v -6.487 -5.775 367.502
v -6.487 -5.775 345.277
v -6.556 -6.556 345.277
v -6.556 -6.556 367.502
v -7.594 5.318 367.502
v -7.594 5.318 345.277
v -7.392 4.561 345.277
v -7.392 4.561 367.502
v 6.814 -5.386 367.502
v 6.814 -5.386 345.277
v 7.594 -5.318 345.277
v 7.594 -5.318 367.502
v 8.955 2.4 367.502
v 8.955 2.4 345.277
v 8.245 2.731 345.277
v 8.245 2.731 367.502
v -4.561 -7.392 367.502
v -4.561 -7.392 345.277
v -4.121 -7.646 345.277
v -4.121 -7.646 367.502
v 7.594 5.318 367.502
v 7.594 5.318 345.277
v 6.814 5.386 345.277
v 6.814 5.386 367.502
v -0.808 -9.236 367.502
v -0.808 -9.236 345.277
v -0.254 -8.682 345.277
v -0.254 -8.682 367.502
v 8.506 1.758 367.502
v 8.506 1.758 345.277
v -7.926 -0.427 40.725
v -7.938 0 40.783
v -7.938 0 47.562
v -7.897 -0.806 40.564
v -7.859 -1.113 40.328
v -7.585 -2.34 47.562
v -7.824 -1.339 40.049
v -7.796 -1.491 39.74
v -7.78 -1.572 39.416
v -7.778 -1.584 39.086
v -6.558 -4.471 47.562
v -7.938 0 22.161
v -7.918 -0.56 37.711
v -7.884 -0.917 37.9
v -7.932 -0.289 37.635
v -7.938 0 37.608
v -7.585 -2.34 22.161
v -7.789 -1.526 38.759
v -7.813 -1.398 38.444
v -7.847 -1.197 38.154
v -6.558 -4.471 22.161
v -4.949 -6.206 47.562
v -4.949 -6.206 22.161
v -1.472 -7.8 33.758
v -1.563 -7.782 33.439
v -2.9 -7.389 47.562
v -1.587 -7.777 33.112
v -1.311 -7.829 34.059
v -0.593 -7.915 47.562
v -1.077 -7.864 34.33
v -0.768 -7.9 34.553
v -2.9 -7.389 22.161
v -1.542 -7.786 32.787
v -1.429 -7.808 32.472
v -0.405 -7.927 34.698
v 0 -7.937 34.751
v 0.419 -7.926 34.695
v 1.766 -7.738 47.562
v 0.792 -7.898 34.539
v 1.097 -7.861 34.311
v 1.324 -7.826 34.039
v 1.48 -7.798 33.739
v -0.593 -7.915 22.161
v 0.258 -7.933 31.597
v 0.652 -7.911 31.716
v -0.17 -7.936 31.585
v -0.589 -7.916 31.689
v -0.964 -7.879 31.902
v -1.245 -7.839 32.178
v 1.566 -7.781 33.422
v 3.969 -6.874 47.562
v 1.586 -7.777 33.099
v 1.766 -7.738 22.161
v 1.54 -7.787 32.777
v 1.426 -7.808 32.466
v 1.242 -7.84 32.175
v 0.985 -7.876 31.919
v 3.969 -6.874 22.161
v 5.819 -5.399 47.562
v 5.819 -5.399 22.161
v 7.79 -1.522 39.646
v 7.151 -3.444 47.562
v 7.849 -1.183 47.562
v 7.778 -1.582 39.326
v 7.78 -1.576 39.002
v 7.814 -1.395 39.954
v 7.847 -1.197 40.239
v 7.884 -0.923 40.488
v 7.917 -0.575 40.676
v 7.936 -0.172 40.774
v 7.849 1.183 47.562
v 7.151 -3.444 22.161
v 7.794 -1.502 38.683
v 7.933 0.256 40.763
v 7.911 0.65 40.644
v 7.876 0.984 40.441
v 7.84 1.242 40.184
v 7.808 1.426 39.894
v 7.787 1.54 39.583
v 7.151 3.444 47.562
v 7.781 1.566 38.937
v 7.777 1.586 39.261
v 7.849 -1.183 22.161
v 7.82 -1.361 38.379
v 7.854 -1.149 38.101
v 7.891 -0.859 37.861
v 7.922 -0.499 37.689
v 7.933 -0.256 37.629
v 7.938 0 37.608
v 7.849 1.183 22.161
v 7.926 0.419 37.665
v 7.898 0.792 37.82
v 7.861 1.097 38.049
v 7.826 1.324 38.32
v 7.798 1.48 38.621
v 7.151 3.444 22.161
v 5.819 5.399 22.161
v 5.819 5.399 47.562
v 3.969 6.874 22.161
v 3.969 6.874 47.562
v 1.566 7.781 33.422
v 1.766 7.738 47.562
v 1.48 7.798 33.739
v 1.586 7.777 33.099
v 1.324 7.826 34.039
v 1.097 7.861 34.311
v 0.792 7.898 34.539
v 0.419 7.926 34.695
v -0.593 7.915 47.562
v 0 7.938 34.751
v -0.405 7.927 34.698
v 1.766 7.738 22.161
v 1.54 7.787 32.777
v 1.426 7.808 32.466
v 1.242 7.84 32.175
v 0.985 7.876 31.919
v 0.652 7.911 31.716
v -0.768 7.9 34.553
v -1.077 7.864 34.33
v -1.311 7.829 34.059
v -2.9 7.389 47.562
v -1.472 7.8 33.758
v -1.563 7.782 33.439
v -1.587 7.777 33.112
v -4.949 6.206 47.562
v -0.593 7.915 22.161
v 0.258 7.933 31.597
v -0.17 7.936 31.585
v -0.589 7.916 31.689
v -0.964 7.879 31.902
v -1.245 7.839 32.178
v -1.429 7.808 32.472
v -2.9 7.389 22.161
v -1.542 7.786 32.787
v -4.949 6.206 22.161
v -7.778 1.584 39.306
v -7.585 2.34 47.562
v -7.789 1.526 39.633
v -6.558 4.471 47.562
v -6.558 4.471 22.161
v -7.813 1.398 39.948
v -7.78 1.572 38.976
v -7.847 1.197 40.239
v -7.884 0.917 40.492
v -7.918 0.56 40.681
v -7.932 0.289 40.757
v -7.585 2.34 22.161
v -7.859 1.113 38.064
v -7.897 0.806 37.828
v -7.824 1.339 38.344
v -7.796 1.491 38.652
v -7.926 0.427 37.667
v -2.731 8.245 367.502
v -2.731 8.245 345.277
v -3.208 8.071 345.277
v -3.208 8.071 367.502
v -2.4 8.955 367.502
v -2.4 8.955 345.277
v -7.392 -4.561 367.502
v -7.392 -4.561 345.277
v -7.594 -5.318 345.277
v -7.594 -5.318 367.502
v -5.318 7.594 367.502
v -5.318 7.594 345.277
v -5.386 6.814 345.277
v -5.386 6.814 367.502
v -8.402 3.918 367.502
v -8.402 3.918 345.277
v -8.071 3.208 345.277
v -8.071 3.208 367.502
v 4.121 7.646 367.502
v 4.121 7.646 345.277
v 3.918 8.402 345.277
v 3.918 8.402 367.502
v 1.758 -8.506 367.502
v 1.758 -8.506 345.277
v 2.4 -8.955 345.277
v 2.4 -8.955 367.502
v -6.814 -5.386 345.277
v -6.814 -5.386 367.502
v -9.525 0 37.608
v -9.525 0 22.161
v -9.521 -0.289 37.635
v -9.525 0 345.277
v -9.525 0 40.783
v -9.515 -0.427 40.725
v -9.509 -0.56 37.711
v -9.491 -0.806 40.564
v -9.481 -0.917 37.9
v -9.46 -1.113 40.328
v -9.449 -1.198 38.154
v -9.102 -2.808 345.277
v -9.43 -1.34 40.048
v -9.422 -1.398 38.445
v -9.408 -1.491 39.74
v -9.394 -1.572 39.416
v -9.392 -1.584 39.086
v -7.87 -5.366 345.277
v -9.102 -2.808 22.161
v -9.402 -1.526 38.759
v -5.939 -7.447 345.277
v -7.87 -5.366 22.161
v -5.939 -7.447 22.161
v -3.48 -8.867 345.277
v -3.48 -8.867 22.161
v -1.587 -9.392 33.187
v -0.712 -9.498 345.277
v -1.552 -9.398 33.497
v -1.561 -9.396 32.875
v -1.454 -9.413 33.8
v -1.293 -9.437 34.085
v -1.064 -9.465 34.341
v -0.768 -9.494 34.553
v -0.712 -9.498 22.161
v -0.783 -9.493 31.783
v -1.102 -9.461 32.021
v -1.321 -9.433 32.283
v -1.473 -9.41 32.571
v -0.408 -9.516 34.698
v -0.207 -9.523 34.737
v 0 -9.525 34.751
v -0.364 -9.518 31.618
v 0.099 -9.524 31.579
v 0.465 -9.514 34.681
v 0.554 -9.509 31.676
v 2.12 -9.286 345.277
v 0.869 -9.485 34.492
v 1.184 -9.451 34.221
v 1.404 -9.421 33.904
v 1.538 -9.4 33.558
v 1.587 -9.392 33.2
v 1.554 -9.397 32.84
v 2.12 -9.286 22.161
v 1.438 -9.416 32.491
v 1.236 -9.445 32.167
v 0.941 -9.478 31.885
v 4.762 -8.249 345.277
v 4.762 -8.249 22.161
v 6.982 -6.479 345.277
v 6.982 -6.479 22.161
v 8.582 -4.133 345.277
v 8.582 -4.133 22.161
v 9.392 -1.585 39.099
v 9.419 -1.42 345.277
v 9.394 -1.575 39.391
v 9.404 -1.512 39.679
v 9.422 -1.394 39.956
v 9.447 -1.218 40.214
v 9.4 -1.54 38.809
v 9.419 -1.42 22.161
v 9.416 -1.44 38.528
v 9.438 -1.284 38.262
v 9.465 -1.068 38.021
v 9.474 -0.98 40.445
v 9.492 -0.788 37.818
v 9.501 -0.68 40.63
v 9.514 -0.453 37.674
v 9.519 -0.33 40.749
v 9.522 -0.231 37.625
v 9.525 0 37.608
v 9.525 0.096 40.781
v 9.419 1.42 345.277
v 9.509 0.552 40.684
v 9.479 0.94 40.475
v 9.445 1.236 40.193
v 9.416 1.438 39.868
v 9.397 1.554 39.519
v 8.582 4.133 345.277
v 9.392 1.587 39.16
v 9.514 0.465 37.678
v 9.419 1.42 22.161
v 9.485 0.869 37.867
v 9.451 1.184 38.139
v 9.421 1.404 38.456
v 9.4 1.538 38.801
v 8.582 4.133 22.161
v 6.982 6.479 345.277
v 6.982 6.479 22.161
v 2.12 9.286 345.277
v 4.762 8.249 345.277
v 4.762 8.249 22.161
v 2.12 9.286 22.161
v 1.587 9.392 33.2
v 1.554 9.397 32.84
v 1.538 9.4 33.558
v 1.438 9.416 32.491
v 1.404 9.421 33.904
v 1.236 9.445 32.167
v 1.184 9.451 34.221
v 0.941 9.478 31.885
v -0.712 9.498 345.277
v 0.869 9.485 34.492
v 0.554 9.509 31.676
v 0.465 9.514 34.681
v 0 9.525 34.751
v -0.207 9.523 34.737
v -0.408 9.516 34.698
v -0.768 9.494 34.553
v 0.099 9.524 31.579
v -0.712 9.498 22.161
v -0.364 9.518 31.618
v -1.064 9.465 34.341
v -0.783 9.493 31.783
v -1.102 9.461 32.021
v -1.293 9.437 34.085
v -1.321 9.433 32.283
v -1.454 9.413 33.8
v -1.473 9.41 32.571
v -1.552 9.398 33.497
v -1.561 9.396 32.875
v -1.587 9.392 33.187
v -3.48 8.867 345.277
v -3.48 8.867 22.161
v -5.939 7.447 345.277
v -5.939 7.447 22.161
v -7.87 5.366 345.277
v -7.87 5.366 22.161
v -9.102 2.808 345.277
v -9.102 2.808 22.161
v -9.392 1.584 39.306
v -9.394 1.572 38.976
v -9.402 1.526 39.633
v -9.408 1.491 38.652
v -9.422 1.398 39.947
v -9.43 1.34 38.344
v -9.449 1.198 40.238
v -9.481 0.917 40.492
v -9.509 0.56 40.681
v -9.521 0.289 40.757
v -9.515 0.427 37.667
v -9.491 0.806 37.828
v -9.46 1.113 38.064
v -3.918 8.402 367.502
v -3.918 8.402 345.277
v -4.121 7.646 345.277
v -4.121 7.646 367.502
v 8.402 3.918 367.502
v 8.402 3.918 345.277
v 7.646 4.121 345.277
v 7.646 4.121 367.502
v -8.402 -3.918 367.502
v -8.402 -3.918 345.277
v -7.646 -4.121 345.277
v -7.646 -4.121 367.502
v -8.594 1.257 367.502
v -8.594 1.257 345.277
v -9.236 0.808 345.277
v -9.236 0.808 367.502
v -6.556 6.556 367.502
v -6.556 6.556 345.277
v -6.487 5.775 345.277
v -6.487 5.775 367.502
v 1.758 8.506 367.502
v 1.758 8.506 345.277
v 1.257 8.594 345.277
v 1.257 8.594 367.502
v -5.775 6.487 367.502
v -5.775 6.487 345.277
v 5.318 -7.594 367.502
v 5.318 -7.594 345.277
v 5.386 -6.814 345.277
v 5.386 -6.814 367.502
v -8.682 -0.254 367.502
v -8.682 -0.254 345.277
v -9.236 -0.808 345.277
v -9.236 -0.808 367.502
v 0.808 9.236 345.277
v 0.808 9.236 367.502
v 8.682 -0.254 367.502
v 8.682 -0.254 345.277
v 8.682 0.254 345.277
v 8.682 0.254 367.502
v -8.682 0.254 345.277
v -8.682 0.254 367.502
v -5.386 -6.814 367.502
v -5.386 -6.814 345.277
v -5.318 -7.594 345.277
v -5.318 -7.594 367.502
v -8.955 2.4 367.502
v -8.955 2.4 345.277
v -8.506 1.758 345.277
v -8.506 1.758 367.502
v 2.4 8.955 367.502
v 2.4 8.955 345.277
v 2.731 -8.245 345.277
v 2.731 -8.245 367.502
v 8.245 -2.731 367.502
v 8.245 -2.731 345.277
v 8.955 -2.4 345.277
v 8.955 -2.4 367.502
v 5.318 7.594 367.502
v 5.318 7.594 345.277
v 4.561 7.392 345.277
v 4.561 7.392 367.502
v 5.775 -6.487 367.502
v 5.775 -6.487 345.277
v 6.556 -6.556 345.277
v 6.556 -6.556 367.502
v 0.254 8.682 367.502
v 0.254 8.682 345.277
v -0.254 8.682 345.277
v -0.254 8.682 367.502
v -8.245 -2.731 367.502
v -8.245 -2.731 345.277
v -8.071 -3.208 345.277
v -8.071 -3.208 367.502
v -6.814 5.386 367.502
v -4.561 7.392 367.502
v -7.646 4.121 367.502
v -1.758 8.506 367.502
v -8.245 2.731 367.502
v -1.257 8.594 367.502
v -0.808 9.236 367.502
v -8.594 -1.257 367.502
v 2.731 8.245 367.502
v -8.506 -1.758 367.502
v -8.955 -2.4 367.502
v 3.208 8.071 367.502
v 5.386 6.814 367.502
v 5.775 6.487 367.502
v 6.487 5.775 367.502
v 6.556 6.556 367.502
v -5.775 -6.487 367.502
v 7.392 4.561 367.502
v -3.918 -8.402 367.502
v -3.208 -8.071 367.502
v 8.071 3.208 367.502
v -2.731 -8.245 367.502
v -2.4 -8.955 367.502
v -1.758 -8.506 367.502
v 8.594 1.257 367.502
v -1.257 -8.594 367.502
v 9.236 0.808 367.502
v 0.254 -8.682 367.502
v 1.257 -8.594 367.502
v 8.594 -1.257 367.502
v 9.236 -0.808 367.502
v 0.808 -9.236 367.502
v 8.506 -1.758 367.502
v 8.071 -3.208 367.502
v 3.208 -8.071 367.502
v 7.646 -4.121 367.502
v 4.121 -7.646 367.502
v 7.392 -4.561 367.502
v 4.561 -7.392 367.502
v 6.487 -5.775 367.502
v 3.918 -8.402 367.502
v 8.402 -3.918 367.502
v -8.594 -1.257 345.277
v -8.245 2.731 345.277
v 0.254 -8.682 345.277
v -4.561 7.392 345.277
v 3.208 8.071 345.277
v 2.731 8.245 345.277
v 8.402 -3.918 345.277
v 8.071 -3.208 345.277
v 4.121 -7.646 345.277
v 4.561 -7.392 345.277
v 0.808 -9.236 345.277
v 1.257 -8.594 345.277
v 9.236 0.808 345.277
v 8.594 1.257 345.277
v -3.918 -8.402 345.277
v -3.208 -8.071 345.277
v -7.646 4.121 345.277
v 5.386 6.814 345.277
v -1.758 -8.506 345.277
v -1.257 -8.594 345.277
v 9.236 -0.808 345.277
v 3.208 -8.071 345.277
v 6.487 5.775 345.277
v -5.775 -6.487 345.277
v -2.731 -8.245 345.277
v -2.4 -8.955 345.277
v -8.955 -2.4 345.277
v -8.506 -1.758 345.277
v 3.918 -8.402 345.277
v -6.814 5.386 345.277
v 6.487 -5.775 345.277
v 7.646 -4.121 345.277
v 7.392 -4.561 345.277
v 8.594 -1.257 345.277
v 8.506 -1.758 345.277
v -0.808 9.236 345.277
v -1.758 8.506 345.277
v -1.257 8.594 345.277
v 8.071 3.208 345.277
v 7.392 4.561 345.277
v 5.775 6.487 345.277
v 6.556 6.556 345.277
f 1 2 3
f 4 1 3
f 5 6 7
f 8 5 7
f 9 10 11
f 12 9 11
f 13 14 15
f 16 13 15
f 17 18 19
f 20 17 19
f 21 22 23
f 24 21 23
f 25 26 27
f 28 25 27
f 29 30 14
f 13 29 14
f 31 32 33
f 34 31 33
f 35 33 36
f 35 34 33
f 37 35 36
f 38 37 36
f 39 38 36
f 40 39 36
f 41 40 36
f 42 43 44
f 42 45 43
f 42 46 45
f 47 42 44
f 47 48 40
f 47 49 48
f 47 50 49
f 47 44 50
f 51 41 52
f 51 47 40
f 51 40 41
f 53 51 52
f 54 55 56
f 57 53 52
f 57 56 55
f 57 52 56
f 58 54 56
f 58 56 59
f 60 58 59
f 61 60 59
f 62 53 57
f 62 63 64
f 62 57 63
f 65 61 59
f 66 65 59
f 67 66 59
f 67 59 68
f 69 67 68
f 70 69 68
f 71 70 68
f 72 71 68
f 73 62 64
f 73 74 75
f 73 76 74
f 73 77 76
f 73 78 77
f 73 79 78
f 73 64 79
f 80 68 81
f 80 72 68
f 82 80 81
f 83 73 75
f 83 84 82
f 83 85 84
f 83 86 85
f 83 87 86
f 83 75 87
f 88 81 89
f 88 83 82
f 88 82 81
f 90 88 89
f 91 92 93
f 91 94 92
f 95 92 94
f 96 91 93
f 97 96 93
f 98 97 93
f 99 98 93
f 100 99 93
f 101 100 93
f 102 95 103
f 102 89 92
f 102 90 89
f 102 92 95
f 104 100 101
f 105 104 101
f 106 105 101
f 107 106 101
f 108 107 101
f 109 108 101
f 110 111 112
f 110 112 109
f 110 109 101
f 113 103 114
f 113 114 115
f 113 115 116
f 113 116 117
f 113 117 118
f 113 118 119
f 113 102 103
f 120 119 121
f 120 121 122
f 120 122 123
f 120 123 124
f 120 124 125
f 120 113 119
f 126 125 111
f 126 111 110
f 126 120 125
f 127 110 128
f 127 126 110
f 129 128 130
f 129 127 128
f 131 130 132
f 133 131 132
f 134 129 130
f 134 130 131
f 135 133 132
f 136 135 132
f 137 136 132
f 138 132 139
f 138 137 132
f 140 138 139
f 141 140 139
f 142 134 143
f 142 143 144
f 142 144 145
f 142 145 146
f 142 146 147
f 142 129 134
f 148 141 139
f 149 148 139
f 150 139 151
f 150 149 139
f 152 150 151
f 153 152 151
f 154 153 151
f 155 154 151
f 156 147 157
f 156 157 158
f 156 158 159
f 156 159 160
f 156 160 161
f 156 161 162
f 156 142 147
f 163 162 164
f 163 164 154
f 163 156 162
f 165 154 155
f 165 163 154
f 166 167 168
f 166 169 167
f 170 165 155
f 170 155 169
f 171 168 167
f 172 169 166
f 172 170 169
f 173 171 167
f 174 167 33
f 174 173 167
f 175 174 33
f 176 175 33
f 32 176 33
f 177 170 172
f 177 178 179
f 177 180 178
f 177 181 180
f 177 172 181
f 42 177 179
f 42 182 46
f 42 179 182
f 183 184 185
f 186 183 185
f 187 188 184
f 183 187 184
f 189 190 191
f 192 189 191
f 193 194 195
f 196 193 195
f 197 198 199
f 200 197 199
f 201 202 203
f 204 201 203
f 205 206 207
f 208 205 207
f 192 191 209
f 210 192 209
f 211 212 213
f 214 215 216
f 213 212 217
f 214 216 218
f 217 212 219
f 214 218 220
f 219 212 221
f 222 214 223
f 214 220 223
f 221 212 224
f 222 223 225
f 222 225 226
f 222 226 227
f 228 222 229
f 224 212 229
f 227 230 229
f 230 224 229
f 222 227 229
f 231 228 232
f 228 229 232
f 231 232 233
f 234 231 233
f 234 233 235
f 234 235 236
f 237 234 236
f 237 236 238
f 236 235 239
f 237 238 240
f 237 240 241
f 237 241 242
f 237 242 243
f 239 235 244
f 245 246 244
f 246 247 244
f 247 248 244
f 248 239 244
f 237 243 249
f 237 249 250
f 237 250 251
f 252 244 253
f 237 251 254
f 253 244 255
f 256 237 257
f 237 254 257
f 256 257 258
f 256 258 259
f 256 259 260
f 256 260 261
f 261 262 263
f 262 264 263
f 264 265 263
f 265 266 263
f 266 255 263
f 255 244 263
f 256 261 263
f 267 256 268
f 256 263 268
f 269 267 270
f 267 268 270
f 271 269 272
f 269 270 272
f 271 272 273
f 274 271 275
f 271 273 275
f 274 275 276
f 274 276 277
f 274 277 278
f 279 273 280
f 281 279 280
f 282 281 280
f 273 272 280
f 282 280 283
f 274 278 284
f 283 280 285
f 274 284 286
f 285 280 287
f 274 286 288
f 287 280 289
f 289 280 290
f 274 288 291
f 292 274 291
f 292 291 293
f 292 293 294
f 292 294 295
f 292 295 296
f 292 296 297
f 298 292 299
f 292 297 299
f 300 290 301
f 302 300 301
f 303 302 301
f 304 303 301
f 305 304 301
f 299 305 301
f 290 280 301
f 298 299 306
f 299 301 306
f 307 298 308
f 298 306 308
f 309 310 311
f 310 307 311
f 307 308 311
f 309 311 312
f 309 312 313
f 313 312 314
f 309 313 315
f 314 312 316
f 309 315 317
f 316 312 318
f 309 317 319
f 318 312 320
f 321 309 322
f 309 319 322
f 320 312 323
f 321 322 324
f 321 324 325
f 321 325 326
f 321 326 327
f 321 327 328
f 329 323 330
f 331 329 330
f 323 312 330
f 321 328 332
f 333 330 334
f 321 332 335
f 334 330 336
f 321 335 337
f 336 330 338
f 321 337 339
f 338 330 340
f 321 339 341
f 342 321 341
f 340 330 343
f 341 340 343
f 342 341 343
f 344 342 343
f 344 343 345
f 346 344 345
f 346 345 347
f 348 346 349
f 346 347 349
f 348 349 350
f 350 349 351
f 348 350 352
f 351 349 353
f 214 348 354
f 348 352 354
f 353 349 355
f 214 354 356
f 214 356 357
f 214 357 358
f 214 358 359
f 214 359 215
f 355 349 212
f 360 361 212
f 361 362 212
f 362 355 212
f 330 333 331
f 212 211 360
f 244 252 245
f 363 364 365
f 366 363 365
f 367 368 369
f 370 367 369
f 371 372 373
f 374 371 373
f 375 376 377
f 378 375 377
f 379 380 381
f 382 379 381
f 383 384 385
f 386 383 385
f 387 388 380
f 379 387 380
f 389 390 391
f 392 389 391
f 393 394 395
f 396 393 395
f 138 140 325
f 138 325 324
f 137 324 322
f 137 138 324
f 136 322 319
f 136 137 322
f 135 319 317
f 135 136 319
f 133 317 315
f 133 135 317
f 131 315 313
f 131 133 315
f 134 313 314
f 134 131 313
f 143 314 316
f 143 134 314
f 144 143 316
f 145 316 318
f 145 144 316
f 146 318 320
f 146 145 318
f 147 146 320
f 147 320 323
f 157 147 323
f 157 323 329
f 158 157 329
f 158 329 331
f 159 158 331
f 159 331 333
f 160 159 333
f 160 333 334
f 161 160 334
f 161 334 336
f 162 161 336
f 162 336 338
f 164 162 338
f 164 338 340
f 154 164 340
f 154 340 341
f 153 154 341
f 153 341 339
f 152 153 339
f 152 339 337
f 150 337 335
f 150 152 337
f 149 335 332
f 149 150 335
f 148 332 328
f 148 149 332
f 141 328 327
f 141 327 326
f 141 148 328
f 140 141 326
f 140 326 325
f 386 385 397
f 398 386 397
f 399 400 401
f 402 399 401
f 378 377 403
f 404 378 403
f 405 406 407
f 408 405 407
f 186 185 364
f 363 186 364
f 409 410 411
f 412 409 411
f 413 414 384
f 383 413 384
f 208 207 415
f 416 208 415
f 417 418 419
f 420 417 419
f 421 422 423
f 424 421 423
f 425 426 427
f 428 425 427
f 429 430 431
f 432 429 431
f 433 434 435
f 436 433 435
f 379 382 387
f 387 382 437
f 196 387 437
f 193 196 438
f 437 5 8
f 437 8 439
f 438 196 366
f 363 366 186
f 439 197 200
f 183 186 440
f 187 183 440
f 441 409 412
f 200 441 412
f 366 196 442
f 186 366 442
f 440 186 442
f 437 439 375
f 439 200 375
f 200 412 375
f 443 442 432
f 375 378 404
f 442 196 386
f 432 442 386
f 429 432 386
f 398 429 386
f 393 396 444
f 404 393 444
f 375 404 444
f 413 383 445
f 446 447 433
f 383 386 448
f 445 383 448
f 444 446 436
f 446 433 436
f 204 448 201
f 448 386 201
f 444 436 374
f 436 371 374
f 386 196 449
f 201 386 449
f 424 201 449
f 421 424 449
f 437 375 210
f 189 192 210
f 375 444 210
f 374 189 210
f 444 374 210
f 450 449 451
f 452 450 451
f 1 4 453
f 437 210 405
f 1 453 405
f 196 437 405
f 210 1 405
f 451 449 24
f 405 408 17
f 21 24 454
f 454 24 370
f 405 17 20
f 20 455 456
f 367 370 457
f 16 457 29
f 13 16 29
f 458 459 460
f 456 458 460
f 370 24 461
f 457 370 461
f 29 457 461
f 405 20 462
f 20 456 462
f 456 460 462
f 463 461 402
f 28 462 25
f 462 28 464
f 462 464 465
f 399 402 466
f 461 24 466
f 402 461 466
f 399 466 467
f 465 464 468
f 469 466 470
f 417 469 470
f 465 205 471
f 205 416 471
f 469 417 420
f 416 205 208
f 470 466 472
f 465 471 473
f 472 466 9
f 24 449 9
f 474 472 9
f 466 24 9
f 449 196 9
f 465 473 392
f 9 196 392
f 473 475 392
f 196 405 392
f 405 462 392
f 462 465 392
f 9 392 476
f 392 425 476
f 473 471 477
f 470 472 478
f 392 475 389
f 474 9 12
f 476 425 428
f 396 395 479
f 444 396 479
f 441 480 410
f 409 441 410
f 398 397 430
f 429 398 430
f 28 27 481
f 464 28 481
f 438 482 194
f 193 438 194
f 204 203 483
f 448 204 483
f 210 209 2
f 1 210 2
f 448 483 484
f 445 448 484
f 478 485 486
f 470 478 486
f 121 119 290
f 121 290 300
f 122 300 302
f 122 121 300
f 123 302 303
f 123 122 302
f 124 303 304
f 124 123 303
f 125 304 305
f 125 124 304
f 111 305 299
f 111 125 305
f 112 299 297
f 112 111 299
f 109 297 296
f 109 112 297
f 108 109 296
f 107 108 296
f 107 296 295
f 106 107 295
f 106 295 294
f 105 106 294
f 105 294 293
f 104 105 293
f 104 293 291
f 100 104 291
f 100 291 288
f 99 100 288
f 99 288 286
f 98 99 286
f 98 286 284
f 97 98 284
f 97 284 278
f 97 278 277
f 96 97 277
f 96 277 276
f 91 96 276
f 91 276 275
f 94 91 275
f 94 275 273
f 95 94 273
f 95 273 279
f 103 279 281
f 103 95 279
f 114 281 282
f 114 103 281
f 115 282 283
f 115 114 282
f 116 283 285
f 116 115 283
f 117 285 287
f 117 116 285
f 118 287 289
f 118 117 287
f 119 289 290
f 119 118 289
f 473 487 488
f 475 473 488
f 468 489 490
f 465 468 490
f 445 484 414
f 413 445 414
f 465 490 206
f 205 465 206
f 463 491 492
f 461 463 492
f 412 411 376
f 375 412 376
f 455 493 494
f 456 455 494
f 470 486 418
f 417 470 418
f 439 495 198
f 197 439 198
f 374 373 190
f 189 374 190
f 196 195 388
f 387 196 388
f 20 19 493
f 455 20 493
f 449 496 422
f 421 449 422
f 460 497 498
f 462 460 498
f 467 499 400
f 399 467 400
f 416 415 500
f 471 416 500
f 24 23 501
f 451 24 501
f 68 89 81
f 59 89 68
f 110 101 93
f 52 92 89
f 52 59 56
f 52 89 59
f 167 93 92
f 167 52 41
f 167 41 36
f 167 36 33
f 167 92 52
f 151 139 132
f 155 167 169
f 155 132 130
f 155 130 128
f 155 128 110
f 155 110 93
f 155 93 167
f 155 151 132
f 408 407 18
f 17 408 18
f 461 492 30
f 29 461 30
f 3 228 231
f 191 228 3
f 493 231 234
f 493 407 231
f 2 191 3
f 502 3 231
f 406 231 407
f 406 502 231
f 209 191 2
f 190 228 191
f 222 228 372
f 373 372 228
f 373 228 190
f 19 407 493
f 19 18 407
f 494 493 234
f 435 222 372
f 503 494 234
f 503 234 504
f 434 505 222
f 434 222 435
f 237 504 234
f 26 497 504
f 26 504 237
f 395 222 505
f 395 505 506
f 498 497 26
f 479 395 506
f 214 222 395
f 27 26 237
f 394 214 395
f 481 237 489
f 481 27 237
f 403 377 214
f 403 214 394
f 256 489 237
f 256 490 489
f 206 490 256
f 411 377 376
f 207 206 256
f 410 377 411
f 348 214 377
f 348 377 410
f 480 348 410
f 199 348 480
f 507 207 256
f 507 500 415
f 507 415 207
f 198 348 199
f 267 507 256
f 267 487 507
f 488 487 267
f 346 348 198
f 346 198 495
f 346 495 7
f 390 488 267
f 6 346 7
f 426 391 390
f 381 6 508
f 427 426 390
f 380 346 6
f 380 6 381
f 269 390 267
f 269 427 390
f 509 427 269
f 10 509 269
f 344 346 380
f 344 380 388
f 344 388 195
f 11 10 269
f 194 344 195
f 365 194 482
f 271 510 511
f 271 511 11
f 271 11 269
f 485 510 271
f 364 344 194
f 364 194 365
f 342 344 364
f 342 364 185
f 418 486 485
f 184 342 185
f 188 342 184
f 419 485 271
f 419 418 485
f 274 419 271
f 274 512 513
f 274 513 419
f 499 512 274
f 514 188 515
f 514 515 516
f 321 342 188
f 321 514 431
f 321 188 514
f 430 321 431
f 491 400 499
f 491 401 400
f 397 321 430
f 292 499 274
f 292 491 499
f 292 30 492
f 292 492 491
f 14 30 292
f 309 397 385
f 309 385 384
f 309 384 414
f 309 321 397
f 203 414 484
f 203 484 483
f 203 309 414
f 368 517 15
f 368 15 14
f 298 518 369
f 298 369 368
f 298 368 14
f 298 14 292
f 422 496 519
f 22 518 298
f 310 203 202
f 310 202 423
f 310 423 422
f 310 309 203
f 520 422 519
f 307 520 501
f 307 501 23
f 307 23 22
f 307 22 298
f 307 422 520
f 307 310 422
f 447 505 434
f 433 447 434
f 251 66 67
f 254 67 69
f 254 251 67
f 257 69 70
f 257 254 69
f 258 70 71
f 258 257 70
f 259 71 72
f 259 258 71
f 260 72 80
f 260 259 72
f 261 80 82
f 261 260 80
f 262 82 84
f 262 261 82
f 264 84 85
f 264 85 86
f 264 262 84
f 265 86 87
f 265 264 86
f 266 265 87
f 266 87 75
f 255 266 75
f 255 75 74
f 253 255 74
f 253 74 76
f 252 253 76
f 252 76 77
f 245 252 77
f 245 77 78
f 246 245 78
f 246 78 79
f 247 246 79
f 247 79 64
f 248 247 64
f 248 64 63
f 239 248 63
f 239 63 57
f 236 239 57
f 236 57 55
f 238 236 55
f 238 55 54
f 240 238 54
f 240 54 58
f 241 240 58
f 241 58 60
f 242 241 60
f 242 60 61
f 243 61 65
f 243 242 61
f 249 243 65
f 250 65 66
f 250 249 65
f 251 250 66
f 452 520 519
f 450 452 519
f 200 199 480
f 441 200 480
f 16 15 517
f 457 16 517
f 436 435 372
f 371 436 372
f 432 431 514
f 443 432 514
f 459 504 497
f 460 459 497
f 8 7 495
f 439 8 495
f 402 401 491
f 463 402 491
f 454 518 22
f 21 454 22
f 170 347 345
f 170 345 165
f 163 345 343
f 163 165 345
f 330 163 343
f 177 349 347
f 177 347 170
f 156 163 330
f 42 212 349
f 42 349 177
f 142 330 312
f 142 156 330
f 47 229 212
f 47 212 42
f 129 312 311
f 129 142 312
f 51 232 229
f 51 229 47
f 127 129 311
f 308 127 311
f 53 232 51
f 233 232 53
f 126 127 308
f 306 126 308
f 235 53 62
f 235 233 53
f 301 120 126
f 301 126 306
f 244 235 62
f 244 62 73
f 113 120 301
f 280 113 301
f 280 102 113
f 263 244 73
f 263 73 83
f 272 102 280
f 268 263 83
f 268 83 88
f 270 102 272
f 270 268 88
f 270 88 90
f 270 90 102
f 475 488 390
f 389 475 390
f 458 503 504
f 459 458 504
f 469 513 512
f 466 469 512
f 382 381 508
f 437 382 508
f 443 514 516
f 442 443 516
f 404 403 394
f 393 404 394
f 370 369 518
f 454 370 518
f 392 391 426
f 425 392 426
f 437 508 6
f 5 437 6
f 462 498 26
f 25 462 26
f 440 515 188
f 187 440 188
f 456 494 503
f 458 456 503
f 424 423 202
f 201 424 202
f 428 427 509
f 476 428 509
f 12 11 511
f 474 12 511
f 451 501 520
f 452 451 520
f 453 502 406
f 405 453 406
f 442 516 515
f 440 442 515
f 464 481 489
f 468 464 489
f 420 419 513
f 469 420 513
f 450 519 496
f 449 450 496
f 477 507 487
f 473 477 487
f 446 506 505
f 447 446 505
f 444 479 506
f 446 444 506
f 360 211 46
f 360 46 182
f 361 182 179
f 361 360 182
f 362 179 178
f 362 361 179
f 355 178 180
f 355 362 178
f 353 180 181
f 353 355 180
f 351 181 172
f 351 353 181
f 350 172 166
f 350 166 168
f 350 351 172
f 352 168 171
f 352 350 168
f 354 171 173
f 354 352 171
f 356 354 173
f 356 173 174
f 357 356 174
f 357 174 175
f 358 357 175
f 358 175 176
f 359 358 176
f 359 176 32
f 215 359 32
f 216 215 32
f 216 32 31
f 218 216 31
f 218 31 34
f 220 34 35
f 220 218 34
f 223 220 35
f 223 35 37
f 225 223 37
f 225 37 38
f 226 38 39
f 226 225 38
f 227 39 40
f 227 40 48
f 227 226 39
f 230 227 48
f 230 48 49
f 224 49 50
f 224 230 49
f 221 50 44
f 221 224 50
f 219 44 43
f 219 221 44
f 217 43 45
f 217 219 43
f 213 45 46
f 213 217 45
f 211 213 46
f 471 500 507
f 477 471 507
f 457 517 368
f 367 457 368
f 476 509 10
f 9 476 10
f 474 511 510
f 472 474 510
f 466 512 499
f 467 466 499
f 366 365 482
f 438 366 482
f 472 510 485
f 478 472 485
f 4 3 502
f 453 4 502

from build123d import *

# Parameters (mm, degrees)
SKETCH5_W               = 1.587499994
SKETCH5_H               = 345.340081988
CUT_EXTRUDE5_DEPTH      = 368.748370511
CUT_EXTRUDE5_DEPTH_BACK = 368.748370511
SKETCH7_R               = 1.5875
CUT_EXTRUDE6_DEPTH      = 368.748370616
CUT_EXTRUDE6_DEPTH_BACK = 368.748370616
SKETCH6_R               = 1.5875
CUT_EXTRUDE7_START      = 367.501582
SKETCH8_R               = 12.7
CUT_EXTRUDE7_DEPTH      = 22.225
SKETCH10_R              = 7.9375
BOSS_EXTRUDE1_DEPTH     = 319.940081988


with BuildPart() as part:
    # Sketch5 → Revolve2 (revolve)
    with BuildSketch(Plane(origin=(0, 0, 0), x_dir=(1, 0, 0), z_dir=(0, 1, 0)), mode=Mode.PRIVATE) as revolve2_sk:
        with Locations((8.731249997, -194.831540994)):
            Rectangle(SKETCH5_W, SKETCH5_H)
    revolve(revolve2_sk.sketch.rotate(Axis((0, 0, 0), (0, 0, 1)), 180), axis=Axis((0, 0, 0), (0, 0, 1)))

    # Sketch7 → Cut-Extrude5 (cut, two sides: drawn at the far end of the back side and taken through both)
    with BuildSketch(Plane(origin=(0, 0, 0), x_dir=(0, 0, -1), z_dir=(1, 0, 0)).offset(-CUT_EXTRUDE5_DEPTH_BACK)):
        with Locations((-39.195999993, 0)):
            Circle(SKETCH7_R)
    extrude(amount=CUT_EXTRUDE5_DEPTH + CUT_EXTRUDE5_DEPTH_BACK, mode=Mode.SUBTRACT)

    # Sketch6 → Cut-Extrude6 (cut, two sides: drawn at the far end of the back side and taken through both)
    with BuildSketch(Plane(origin=(0, 0, 0), x_dir=(1, 0, 0), z_dir=(0, 1, 0)).offset(-CUT_EXTRUDE6_DEPTH_BACK)):
        with Locations(Location((1e-09, -33.163499999, 0), (0, 0, 269.999999955))):
            Circle(SKETCH6_R)
    extrude(amount=CUT_EXTRUDE6_DEPTH + CUT_EXTRUDE6_DEPTH_BACK, mode=Mode.SUBTRACT)

    # Sketch8 → Cut-Extrude7 (cut)
    with BuildSketch(Plane.XY.offset(CUT_EXTRUDE7_START)):
        Circle(SKETCH8_R)
        Polygon((9.235721046, -0.808020891), (8.681700155, -0.254), (8.681700155, 0.254), (9.235721046, 0.808020891), (8.593912259, 1.257420242), (8.505698985, 1.75770258), (8.955098336, 2.399511367), (8.245002688, 2.730634406), (8.071256455, 3.207998257), (8.402379494, 3.918093905), (7.645572882, 4.120879625), (7.391572882, 4.56082053), (7.594358603, 5.317627141), (6.813836213, 5.385914002), (6.487300108, 5.775064579), (6.555586968, 6.555586968), (5.775064579, 6.487300108), (5.385914002, 6.813836213), (5.317627141, 7.594358603), (4.56082053, 7.391572882), (4.120879625, 7.645572882), (3.918093905, 8.402379494), (3.207998257, 8.071256455), (2.730634406, 8.245002688), (2.399511367, 8.955098336), (1.75770258, 8.505698985), (1.257420242, 8.593912259), (0.808020891, 9.235721046), (0.254, 8.681700155), (-0.254, 8.681700155), (-0.808020891, 9.235721046), (-1.257420242, 8.593912259), (-1.75770258, 8.505698985), (-2.399511367, 8.955098336), (-2.730634406, 8.245002688), (-3.207998257, 8.071256455), (-3.918093905, 8.402379494), (-4.120879625, 7.645572882), (-4.56082053, 7.391572882), (-5.317627141, 7.594358603), (-5.385914002, 6.813836213), (-5.775064579, 6.487300108), (-6.555586968, 6.555586968), (-6.487300108, 5.775064579), (-6.813836213, 5.385914002), (-7.594358603, 5.317627141), (-7.391572882, 4.56082053), (-7.645572882, 4.120879625), (-8.402379494, 3.918093905), (-8.071256455, 3.207998257), (-8.245002688, 2.730634406), (-8.955098336, 2.399511367), (-8.505698985, 1.75770258), (-8.593912259, 1.257420242), (-9.235721046, 0.808020891), (-8.681700155, 0.254), (-8.681700155, -0.254), (-9.235721046, -0.808020891), (-8.593912259, -1.257420242), (-8.505698985, -1.75770258), (-8.955098336, -2.399511367), (-8.245002688, -2.730634406), (-8.071256455, -3.207998257), (-8.402379494, -3.918093905), (-7.645572882, -4.120879625), (-7.391572882, -4.56082053), (-7.594358603, -5.317627141), (-6.813836213, -5.385914002), (-6.487300108, -5.775064579), (-6.555586968, -6.555586968), (-5.775064579, -6.487300108), (-5.385914002, -6.813836213), (-5.317627141, -7.594358603), (-4.56082053, -7.391572882), (-4.120879625, -7.645572882), (-3.918093905, -8.402379494), (-3.207998257, -8.071256455), (-2.730634406, -8.245002688), (-2.399511367, -8.955098336), (-1.75770258, -8.505698985), (-1.257420242, -8.593912259), (-0.808020891, -9.235721046), (-0.254, -8.681700155), (0.254, -8.681700155), (0.808020891, -9.235721046), (1.257420242, -8.593912259), (1.75770258, -8.505698985), (2.399511367, -8.955098336), (2.730634406, -8.245002688), (3.207998257, -8.071256455), (3.918093905, -8.402379494), (4.120879625, -7.645572882), (4.56082053, -7.391572882), (5.317627141, -7.594358603), (5.385914002, -6.813836213), (5.775064579, -6.487300108), (6.555586968, -6.555586968), (6.487300108, -5.775064579), (6.813836213, -5.385914002), (7.594358603, -5.317627141), (7.391572882, -4.56082053), (7.645572882, -4.120879625), (8.402379494, -3.918093905), (8.071256455, -3.207998257), (8.245002688, -2.730634406), (8.955098336, -2.399511367), (8.505698985, -1.75770258), (8.593912259, -1.257420242), align=None, mode=Mode.SUBTRACT)
    extrude(amount=-CUT_EXTRUDE7_DEPTH, mode=Mode.SUBTRACT)

    # Sketch10 → Boss-Extrude1 (add)
    with BuildSketch(Plane(origin=(0, 0, 47.5615), x_dir=(-1, 0, 0), z_dir=(0, 0, -1))):
        Circle(SKETCH10_R)
    extrude(amount=-BOSS_EXTRUDE1_DEPTH)


solid = part.part
